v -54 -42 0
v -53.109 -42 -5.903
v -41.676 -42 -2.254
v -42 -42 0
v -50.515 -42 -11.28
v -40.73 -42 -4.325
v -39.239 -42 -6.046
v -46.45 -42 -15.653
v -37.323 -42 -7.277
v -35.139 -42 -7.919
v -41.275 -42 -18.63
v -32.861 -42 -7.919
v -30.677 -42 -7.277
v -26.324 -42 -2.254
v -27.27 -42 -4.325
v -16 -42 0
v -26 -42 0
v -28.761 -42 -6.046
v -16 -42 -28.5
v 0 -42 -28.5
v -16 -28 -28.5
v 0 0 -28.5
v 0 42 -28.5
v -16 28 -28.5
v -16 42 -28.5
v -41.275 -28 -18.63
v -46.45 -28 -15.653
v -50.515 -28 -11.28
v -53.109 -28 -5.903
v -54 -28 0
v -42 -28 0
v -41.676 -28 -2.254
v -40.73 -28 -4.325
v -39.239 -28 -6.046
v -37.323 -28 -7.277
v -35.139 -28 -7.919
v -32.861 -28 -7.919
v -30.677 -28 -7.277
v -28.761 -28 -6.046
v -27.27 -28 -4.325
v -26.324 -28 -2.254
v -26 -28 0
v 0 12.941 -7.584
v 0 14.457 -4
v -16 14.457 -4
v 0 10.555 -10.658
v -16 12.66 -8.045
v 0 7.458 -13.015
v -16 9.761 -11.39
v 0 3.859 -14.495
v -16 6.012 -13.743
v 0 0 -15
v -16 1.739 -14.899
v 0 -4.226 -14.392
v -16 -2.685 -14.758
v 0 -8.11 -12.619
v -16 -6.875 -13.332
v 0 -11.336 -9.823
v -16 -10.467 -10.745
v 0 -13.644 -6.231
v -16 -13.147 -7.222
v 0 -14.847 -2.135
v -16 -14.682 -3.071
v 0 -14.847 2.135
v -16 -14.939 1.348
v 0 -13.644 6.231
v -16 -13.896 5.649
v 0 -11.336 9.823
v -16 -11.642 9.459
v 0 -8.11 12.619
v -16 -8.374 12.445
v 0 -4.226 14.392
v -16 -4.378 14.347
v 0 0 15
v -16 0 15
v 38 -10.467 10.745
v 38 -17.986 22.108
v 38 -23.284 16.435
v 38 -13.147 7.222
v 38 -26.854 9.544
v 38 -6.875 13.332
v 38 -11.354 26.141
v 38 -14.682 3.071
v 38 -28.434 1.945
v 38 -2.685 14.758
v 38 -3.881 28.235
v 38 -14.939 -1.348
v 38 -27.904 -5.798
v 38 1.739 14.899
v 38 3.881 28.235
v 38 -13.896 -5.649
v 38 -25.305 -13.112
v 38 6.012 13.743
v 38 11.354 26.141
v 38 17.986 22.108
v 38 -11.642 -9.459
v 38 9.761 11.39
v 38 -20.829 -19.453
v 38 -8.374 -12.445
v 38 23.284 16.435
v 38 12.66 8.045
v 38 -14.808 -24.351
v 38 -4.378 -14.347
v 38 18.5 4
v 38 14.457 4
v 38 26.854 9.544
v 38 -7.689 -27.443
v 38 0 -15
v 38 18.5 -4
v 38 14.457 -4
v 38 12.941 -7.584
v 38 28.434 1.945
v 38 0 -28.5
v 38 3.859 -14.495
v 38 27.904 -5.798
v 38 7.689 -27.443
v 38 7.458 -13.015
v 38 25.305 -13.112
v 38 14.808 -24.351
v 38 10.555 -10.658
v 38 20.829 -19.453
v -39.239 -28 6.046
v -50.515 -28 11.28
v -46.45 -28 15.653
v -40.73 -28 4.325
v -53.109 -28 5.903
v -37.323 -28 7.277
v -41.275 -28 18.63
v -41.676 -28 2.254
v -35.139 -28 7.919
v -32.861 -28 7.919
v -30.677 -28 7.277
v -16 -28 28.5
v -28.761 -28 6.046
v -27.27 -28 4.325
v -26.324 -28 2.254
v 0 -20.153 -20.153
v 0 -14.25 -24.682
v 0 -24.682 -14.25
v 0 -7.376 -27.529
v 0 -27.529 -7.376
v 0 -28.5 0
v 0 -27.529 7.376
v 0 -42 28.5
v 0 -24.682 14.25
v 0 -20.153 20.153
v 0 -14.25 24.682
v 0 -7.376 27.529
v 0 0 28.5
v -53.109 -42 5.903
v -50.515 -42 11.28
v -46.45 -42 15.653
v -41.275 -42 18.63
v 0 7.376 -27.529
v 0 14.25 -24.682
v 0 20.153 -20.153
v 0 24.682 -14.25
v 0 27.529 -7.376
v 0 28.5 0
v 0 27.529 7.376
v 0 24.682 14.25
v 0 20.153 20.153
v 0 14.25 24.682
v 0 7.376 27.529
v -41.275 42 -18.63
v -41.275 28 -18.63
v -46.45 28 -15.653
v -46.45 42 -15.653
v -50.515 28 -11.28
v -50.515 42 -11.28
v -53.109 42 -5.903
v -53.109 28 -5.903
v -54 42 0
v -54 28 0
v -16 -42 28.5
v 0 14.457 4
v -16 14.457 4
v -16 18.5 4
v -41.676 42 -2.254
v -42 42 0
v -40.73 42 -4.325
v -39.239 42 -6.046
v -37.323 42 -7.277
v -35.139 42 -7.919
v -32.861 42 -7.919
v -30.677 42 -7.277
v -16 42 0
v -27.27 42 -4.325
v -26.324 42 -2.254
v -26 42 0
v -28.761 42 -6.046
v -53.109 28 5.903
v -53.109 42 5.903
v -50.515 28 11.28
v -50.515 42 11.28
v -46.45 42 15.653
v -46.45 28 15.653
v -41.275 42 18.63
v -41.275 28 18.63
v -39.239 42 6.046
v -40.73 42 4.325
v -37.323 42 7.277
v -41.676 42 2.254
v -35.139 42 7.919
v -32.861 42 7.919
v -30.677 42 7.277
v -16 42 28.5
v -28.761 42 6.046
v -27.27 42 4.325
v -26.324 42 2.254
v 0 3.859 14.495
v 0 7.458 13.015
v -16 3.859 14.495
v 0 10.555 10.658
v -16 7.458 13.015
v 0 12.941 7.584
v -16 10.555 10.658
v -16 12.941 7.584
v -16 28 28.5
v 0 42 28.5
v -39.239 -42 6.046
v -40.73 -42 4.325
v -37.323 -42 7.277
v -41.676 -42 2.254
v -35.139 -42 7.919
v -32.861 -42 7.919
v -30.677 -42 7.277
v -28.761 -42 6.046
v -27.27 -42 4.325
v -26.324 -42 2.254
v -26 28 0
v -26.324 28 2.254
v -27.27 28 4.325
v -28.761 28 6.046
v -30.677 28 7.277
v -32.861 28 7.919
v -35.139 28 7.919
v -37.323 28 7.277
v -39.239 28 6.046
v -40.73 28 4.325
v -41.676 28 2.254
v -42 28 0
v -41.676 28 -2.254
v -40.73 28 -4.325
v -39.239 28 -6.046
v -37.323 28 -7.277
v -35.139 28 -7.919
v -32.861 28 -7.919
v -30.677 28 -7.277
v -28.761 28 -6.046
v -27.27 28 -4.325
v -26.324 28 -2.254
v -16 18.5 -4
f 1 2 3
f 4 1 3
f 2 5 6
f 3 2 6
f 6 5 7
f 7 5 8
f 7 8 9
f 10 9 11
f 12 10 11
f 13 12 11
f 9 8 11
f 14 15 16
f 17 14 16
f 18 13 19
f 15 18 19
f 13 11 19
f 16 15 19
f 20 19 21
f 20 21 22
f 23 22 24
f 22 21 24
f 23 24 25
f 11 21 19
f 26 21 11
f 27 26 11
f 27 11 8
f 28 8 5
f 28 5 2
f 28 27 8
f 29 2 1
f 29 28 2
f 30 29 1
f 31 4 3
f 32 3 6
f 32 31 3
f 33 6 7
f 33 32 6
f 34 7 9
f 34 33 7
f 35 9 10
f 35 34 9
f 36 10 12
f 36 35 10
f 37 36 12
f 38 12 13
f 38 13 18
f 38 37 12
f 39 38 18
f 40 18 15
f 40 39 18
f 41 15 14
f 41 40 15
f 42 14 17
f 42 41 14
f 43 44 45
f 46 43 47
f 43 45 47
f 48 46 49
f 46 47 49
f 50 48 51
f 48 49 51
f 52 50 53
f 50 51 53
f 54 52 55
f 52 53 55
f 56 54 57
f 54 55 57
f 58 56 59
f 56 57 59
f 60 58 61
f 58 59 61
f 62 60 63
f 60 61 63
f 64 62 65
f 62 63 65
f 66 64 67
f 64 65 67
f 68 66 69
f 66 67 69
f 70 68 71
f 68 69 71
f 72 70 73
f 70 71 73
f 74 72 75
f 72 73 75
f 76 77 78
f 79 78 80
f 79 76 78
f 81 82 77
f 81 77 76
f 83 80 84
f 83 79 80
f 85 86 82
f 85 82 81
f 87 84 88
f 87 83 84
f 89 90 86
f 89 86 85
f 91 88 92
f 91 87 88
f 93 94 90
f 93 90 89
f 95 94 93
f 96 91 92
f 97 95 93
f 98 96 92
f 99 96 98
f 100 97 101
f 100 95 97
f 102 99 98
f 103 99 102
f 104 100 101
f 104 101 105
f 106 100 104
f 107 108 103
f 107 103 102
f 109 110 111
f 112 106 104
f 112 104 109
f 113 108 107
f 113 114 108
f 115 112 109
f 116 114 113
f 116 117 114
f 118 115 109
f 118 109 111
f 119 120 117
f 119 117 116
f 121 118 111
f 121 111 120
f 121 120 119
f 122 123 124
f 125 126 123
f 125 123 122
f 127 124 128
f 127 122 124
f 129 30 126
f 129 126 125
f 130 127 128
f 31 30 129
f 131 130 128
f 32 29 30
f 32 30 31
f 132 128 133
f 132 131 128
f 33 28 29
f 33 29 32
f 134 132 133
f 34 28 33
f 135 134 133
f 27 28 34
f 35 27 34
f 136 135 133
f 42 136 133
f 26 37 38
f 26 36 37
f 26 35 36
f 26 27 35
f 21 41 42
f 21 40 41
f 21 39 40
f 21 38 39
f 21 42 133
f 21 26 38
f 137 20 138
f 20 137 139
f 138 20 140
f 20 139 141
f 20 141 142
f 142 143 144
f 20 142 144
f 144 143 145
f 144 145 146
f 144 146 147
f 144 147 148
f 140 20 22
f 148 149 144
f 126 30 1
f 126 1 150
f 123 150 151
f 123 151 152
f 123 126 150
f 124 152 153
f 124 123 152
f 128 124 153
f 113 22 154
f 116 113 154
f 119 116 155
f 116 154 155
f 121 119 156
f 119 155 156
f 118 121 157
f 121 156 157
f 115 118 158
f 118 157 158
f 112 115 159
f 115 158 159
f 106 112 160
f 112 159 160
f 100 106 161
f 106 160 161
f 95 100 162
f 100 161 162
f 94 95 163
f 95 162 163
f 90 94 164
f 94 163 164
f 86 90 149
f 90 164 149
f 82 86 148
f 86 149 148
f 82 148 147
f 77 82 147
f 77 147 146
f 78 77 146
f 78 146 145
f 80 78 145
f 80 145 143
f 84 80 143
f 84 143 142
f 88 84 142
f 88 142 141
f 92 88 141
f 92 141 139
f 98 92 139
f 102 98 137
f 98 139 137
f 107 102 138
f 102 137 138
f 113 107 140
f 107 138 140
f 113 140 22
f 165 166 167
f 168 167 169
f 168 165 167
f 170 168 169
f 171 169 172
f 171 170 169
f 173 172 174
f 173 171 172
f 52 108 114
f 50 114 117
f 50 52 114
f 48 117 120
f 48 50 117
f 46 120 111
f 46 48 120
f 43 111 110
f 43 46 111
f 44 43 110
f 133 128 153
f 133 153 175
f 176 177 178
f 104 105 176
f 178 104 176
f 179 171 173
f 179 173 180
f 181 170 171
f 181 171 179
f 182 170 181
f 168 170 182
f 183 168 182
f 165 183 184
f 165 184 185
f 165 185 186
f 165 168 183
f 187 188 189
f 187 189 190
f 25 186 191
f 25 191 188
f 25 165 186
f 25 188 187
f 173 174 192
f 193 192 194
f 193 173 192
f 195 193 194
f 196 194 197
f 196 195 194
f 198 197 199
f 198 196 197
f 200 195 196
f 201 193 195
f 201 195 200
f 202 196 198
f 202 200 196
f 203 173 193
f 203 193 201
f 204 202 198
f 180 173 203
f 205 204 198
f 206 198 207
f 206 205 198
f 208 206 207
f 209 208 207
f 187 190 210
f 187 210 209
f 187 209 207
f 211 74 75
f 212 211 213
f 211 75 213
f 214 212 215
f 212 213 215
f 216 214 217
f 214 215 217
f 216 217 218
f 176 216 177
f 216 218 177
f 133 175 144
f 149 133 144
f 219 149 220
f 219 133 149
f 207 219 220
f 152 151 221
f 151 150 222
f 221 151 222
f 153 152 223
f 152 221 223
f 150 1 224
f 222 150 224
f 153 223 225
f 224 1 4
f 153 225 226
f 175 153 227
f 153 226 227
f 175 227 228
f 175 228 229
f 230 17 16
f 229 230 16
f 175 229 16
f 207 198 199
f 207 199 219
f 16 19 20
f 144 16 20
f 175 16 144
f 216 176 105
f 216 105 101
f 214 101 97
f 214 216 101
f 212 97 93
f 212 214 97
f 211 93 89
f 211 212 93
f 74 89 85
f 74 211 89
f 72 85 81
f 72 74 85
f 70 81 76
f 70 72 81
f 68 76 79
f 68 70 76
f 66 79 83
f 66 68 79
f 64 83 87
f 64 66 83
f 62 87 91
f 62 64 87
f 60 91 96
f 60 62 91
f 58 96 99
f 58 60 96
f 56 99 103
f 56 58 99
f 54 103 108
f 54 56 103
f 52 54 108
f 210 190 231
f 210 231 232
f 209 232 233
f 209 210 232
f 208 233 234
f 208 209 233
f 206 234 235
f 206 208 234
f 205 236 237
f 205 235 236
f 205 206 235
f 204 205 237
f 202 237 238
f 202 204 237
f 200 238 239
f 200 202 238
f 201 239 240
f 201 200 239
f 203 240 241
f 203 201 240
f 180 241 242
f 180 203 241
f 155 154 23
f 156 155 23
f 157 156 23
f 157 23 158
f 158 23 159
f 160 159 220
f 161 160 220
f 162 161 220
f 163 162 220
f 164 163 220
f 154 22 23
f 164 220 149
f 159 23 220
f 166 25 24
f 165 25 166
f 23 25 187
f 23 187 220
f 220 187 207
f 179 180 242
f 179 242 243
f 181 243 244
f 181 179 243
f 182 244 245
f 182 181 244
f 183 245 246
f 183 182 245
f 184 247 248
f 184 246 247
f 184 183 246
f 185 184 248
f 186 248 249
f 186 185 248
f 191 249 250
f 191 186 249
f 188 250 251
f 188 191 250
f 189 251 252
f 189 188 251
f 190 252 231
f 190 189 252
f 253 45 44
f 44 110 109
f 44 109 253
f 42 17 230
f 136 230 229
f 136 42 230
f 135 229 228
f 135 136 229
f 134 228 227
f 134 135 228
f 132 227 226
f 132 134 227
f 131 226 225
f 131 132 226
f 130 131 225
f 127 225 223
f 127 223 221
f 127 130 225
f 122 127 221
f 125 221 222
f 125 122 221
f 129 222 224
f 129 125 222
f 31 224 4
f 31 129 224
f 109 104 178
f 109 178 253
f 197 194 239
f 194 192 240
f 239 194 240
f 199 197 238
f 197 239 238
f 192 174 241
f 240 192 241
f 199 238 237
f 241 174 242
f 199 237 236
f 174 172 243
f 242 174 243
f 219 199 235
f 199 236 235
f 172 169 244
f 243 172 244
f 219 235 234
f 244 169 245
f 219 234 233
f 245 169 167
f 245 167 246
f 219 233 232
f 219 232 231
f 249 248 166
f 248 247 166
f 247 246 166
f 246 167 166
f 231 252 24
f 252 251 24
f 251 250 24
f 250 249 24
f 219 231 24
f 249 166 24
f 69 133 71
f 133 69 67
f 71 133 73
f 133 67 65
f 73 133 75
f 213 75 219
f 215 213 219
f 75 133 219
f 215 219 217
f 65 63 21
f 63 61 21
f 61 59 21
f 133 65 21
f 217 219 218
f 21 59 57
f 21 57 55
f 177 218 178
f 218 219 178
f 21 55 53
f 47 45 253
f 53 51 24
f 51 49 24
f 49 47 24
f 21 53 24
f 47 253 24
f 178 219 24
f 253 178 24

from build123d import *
from build123d.topology import SkipClean

# Parameters (mm, degrees)
SKETCH1_R           = 28.5
SKETCH1_R_2         = 15
BOSS_EXTRUDE1_DEPTH = 38
BOSS_EXTRUDE2_START = 16
SKETCH3_W           = 57
SKETCH3_H           = 84
SKETCH3_R           = 15
BOSS_EXTRUDE2_DEPTH = 16
BOSS_EXTRUDE3_DEPTH = 84
CUT_EXTRUDE1_DEPTH  = 28
SKETCH7_W           = 8
SKETCH7_H           = 7
CUT_EXTRUDE2_DEPTH  = 106.072593953


with BuildPart() as part:
    # Sketch1 → Boss-Extrude1 (new body)
    with BuildSketch(Plane(origin=(0, 0, 0), x_dir=(0, 0, -1), z_dir=(1, 0, 0))):
        Circle(SKETCH1_R)
        Circle(SKETCH1_R_2, mode=Mode.SUBTRACT)
    extrude(amount=BOSS_EXTRUDE1_DEPTH)

    # Sketch3 → Boss-Extrude2 (add)
    with SkipClean():  # the faces are left unmerged after this step: merging them gives an invalid solid
        with BuildSketch(Plane.ZY.offset(BOSS_EXTRUDE2_START)):
            Rectangle(SKETCH3_W, SKETCH3_H)
            Circle(SKETCH3_R, mode=Mode.SUBTRACT)
        extrude(amount=-BOSS_EXTRUDE2_DEPTH)

    # Sketch4 → Boss-Extrude3 (add)
    with SkipClean():  # the faces are left unmerged after this step: merging them gives an invalid solid
        with BuildSketch(Plane(origin=(0, 42, 0), x_dir=(1, 0, 0), z_dir=(0, 1, 0))):
            with BuildLine():
                Line((-16, 0), (-16, 28.5))
                Line((-16, 28.5), (-41.275105345, 18.629891095))
                ThreePointArc((-41.275105345, 18.629891095), (-50.515176458, 11.280467479), (-54, 0))
                Line((-54, 0), (-42, 0))
                ThreePointArc((-42, 0), (-34, 8), (-26, 0))
                Line((-26, 0), (-16, 0))
            make_face()
            with BuildLine():
                Line((-16, -28.5), (-16, 0))
                Line((-16, 0), (-26, 0))
                ThreePointArc((-26, 0), (-34, -8), (-42, 0))
                Line((-42, 0), (-54, 0))
                ThreePointArc((-54, 0), (-50.515176458, -11.280467479), (-41.275105345, -18.629891095))
                Line((-41.275105345, -18.629891095), (-16, -28.5))
            make_face()
        extrude(amount=-BOSS_EXTRUDE3_DEPTH)

    # Sketch5 → Cut-Extrude1 (cut, symmetric)
    with SkipClean():  # the faces are left unmerged after this step: merging them gives an invalid solid
        with BuildSketch(Plane(origin=(0, 0, 0), x_dir=(1, 0, 0), z_dir=(0, 1, 0))):
            with BuildLine():
                Line((-16, 28.5), (-41.275105345, 18.629891095))
                ThreePointArc((-41.275105345, 18.629891095), (-54, 0), (-41.275105345, -18.629891095))
                Line((-41.275105345, -18.629891095), (-16, -28.5))
                Line((-16, -28.5), (-16, 28.5))
            make_face()
        extrude(amount=CUT_EXTRUDE1_DEPTH, both=True, mode=Mode.SUBTRACT)

    # Sketch7 → Cut-Extrude2 (cut, through all)
    with SkipClean():  # the faces are left unmerged after this step: merging them gives an invalid solid
        with BuildSketch(Plane(origin=(38, 0, 0), x_dir=(0, 0, -1), z_dir=(1, 0, 0))):
            with Locations((0, 15)):
                Rectangle(SKETCH7_W, SKETCH7_H)
        extrude(amount=-CUT_EXTRUDE2_DEPTH, mode=Mode.SUBTRACT)
    add(part.part.scale(1), mode=Mode.REPLACE)  # the faces are merged on a copy


solid = part.part
